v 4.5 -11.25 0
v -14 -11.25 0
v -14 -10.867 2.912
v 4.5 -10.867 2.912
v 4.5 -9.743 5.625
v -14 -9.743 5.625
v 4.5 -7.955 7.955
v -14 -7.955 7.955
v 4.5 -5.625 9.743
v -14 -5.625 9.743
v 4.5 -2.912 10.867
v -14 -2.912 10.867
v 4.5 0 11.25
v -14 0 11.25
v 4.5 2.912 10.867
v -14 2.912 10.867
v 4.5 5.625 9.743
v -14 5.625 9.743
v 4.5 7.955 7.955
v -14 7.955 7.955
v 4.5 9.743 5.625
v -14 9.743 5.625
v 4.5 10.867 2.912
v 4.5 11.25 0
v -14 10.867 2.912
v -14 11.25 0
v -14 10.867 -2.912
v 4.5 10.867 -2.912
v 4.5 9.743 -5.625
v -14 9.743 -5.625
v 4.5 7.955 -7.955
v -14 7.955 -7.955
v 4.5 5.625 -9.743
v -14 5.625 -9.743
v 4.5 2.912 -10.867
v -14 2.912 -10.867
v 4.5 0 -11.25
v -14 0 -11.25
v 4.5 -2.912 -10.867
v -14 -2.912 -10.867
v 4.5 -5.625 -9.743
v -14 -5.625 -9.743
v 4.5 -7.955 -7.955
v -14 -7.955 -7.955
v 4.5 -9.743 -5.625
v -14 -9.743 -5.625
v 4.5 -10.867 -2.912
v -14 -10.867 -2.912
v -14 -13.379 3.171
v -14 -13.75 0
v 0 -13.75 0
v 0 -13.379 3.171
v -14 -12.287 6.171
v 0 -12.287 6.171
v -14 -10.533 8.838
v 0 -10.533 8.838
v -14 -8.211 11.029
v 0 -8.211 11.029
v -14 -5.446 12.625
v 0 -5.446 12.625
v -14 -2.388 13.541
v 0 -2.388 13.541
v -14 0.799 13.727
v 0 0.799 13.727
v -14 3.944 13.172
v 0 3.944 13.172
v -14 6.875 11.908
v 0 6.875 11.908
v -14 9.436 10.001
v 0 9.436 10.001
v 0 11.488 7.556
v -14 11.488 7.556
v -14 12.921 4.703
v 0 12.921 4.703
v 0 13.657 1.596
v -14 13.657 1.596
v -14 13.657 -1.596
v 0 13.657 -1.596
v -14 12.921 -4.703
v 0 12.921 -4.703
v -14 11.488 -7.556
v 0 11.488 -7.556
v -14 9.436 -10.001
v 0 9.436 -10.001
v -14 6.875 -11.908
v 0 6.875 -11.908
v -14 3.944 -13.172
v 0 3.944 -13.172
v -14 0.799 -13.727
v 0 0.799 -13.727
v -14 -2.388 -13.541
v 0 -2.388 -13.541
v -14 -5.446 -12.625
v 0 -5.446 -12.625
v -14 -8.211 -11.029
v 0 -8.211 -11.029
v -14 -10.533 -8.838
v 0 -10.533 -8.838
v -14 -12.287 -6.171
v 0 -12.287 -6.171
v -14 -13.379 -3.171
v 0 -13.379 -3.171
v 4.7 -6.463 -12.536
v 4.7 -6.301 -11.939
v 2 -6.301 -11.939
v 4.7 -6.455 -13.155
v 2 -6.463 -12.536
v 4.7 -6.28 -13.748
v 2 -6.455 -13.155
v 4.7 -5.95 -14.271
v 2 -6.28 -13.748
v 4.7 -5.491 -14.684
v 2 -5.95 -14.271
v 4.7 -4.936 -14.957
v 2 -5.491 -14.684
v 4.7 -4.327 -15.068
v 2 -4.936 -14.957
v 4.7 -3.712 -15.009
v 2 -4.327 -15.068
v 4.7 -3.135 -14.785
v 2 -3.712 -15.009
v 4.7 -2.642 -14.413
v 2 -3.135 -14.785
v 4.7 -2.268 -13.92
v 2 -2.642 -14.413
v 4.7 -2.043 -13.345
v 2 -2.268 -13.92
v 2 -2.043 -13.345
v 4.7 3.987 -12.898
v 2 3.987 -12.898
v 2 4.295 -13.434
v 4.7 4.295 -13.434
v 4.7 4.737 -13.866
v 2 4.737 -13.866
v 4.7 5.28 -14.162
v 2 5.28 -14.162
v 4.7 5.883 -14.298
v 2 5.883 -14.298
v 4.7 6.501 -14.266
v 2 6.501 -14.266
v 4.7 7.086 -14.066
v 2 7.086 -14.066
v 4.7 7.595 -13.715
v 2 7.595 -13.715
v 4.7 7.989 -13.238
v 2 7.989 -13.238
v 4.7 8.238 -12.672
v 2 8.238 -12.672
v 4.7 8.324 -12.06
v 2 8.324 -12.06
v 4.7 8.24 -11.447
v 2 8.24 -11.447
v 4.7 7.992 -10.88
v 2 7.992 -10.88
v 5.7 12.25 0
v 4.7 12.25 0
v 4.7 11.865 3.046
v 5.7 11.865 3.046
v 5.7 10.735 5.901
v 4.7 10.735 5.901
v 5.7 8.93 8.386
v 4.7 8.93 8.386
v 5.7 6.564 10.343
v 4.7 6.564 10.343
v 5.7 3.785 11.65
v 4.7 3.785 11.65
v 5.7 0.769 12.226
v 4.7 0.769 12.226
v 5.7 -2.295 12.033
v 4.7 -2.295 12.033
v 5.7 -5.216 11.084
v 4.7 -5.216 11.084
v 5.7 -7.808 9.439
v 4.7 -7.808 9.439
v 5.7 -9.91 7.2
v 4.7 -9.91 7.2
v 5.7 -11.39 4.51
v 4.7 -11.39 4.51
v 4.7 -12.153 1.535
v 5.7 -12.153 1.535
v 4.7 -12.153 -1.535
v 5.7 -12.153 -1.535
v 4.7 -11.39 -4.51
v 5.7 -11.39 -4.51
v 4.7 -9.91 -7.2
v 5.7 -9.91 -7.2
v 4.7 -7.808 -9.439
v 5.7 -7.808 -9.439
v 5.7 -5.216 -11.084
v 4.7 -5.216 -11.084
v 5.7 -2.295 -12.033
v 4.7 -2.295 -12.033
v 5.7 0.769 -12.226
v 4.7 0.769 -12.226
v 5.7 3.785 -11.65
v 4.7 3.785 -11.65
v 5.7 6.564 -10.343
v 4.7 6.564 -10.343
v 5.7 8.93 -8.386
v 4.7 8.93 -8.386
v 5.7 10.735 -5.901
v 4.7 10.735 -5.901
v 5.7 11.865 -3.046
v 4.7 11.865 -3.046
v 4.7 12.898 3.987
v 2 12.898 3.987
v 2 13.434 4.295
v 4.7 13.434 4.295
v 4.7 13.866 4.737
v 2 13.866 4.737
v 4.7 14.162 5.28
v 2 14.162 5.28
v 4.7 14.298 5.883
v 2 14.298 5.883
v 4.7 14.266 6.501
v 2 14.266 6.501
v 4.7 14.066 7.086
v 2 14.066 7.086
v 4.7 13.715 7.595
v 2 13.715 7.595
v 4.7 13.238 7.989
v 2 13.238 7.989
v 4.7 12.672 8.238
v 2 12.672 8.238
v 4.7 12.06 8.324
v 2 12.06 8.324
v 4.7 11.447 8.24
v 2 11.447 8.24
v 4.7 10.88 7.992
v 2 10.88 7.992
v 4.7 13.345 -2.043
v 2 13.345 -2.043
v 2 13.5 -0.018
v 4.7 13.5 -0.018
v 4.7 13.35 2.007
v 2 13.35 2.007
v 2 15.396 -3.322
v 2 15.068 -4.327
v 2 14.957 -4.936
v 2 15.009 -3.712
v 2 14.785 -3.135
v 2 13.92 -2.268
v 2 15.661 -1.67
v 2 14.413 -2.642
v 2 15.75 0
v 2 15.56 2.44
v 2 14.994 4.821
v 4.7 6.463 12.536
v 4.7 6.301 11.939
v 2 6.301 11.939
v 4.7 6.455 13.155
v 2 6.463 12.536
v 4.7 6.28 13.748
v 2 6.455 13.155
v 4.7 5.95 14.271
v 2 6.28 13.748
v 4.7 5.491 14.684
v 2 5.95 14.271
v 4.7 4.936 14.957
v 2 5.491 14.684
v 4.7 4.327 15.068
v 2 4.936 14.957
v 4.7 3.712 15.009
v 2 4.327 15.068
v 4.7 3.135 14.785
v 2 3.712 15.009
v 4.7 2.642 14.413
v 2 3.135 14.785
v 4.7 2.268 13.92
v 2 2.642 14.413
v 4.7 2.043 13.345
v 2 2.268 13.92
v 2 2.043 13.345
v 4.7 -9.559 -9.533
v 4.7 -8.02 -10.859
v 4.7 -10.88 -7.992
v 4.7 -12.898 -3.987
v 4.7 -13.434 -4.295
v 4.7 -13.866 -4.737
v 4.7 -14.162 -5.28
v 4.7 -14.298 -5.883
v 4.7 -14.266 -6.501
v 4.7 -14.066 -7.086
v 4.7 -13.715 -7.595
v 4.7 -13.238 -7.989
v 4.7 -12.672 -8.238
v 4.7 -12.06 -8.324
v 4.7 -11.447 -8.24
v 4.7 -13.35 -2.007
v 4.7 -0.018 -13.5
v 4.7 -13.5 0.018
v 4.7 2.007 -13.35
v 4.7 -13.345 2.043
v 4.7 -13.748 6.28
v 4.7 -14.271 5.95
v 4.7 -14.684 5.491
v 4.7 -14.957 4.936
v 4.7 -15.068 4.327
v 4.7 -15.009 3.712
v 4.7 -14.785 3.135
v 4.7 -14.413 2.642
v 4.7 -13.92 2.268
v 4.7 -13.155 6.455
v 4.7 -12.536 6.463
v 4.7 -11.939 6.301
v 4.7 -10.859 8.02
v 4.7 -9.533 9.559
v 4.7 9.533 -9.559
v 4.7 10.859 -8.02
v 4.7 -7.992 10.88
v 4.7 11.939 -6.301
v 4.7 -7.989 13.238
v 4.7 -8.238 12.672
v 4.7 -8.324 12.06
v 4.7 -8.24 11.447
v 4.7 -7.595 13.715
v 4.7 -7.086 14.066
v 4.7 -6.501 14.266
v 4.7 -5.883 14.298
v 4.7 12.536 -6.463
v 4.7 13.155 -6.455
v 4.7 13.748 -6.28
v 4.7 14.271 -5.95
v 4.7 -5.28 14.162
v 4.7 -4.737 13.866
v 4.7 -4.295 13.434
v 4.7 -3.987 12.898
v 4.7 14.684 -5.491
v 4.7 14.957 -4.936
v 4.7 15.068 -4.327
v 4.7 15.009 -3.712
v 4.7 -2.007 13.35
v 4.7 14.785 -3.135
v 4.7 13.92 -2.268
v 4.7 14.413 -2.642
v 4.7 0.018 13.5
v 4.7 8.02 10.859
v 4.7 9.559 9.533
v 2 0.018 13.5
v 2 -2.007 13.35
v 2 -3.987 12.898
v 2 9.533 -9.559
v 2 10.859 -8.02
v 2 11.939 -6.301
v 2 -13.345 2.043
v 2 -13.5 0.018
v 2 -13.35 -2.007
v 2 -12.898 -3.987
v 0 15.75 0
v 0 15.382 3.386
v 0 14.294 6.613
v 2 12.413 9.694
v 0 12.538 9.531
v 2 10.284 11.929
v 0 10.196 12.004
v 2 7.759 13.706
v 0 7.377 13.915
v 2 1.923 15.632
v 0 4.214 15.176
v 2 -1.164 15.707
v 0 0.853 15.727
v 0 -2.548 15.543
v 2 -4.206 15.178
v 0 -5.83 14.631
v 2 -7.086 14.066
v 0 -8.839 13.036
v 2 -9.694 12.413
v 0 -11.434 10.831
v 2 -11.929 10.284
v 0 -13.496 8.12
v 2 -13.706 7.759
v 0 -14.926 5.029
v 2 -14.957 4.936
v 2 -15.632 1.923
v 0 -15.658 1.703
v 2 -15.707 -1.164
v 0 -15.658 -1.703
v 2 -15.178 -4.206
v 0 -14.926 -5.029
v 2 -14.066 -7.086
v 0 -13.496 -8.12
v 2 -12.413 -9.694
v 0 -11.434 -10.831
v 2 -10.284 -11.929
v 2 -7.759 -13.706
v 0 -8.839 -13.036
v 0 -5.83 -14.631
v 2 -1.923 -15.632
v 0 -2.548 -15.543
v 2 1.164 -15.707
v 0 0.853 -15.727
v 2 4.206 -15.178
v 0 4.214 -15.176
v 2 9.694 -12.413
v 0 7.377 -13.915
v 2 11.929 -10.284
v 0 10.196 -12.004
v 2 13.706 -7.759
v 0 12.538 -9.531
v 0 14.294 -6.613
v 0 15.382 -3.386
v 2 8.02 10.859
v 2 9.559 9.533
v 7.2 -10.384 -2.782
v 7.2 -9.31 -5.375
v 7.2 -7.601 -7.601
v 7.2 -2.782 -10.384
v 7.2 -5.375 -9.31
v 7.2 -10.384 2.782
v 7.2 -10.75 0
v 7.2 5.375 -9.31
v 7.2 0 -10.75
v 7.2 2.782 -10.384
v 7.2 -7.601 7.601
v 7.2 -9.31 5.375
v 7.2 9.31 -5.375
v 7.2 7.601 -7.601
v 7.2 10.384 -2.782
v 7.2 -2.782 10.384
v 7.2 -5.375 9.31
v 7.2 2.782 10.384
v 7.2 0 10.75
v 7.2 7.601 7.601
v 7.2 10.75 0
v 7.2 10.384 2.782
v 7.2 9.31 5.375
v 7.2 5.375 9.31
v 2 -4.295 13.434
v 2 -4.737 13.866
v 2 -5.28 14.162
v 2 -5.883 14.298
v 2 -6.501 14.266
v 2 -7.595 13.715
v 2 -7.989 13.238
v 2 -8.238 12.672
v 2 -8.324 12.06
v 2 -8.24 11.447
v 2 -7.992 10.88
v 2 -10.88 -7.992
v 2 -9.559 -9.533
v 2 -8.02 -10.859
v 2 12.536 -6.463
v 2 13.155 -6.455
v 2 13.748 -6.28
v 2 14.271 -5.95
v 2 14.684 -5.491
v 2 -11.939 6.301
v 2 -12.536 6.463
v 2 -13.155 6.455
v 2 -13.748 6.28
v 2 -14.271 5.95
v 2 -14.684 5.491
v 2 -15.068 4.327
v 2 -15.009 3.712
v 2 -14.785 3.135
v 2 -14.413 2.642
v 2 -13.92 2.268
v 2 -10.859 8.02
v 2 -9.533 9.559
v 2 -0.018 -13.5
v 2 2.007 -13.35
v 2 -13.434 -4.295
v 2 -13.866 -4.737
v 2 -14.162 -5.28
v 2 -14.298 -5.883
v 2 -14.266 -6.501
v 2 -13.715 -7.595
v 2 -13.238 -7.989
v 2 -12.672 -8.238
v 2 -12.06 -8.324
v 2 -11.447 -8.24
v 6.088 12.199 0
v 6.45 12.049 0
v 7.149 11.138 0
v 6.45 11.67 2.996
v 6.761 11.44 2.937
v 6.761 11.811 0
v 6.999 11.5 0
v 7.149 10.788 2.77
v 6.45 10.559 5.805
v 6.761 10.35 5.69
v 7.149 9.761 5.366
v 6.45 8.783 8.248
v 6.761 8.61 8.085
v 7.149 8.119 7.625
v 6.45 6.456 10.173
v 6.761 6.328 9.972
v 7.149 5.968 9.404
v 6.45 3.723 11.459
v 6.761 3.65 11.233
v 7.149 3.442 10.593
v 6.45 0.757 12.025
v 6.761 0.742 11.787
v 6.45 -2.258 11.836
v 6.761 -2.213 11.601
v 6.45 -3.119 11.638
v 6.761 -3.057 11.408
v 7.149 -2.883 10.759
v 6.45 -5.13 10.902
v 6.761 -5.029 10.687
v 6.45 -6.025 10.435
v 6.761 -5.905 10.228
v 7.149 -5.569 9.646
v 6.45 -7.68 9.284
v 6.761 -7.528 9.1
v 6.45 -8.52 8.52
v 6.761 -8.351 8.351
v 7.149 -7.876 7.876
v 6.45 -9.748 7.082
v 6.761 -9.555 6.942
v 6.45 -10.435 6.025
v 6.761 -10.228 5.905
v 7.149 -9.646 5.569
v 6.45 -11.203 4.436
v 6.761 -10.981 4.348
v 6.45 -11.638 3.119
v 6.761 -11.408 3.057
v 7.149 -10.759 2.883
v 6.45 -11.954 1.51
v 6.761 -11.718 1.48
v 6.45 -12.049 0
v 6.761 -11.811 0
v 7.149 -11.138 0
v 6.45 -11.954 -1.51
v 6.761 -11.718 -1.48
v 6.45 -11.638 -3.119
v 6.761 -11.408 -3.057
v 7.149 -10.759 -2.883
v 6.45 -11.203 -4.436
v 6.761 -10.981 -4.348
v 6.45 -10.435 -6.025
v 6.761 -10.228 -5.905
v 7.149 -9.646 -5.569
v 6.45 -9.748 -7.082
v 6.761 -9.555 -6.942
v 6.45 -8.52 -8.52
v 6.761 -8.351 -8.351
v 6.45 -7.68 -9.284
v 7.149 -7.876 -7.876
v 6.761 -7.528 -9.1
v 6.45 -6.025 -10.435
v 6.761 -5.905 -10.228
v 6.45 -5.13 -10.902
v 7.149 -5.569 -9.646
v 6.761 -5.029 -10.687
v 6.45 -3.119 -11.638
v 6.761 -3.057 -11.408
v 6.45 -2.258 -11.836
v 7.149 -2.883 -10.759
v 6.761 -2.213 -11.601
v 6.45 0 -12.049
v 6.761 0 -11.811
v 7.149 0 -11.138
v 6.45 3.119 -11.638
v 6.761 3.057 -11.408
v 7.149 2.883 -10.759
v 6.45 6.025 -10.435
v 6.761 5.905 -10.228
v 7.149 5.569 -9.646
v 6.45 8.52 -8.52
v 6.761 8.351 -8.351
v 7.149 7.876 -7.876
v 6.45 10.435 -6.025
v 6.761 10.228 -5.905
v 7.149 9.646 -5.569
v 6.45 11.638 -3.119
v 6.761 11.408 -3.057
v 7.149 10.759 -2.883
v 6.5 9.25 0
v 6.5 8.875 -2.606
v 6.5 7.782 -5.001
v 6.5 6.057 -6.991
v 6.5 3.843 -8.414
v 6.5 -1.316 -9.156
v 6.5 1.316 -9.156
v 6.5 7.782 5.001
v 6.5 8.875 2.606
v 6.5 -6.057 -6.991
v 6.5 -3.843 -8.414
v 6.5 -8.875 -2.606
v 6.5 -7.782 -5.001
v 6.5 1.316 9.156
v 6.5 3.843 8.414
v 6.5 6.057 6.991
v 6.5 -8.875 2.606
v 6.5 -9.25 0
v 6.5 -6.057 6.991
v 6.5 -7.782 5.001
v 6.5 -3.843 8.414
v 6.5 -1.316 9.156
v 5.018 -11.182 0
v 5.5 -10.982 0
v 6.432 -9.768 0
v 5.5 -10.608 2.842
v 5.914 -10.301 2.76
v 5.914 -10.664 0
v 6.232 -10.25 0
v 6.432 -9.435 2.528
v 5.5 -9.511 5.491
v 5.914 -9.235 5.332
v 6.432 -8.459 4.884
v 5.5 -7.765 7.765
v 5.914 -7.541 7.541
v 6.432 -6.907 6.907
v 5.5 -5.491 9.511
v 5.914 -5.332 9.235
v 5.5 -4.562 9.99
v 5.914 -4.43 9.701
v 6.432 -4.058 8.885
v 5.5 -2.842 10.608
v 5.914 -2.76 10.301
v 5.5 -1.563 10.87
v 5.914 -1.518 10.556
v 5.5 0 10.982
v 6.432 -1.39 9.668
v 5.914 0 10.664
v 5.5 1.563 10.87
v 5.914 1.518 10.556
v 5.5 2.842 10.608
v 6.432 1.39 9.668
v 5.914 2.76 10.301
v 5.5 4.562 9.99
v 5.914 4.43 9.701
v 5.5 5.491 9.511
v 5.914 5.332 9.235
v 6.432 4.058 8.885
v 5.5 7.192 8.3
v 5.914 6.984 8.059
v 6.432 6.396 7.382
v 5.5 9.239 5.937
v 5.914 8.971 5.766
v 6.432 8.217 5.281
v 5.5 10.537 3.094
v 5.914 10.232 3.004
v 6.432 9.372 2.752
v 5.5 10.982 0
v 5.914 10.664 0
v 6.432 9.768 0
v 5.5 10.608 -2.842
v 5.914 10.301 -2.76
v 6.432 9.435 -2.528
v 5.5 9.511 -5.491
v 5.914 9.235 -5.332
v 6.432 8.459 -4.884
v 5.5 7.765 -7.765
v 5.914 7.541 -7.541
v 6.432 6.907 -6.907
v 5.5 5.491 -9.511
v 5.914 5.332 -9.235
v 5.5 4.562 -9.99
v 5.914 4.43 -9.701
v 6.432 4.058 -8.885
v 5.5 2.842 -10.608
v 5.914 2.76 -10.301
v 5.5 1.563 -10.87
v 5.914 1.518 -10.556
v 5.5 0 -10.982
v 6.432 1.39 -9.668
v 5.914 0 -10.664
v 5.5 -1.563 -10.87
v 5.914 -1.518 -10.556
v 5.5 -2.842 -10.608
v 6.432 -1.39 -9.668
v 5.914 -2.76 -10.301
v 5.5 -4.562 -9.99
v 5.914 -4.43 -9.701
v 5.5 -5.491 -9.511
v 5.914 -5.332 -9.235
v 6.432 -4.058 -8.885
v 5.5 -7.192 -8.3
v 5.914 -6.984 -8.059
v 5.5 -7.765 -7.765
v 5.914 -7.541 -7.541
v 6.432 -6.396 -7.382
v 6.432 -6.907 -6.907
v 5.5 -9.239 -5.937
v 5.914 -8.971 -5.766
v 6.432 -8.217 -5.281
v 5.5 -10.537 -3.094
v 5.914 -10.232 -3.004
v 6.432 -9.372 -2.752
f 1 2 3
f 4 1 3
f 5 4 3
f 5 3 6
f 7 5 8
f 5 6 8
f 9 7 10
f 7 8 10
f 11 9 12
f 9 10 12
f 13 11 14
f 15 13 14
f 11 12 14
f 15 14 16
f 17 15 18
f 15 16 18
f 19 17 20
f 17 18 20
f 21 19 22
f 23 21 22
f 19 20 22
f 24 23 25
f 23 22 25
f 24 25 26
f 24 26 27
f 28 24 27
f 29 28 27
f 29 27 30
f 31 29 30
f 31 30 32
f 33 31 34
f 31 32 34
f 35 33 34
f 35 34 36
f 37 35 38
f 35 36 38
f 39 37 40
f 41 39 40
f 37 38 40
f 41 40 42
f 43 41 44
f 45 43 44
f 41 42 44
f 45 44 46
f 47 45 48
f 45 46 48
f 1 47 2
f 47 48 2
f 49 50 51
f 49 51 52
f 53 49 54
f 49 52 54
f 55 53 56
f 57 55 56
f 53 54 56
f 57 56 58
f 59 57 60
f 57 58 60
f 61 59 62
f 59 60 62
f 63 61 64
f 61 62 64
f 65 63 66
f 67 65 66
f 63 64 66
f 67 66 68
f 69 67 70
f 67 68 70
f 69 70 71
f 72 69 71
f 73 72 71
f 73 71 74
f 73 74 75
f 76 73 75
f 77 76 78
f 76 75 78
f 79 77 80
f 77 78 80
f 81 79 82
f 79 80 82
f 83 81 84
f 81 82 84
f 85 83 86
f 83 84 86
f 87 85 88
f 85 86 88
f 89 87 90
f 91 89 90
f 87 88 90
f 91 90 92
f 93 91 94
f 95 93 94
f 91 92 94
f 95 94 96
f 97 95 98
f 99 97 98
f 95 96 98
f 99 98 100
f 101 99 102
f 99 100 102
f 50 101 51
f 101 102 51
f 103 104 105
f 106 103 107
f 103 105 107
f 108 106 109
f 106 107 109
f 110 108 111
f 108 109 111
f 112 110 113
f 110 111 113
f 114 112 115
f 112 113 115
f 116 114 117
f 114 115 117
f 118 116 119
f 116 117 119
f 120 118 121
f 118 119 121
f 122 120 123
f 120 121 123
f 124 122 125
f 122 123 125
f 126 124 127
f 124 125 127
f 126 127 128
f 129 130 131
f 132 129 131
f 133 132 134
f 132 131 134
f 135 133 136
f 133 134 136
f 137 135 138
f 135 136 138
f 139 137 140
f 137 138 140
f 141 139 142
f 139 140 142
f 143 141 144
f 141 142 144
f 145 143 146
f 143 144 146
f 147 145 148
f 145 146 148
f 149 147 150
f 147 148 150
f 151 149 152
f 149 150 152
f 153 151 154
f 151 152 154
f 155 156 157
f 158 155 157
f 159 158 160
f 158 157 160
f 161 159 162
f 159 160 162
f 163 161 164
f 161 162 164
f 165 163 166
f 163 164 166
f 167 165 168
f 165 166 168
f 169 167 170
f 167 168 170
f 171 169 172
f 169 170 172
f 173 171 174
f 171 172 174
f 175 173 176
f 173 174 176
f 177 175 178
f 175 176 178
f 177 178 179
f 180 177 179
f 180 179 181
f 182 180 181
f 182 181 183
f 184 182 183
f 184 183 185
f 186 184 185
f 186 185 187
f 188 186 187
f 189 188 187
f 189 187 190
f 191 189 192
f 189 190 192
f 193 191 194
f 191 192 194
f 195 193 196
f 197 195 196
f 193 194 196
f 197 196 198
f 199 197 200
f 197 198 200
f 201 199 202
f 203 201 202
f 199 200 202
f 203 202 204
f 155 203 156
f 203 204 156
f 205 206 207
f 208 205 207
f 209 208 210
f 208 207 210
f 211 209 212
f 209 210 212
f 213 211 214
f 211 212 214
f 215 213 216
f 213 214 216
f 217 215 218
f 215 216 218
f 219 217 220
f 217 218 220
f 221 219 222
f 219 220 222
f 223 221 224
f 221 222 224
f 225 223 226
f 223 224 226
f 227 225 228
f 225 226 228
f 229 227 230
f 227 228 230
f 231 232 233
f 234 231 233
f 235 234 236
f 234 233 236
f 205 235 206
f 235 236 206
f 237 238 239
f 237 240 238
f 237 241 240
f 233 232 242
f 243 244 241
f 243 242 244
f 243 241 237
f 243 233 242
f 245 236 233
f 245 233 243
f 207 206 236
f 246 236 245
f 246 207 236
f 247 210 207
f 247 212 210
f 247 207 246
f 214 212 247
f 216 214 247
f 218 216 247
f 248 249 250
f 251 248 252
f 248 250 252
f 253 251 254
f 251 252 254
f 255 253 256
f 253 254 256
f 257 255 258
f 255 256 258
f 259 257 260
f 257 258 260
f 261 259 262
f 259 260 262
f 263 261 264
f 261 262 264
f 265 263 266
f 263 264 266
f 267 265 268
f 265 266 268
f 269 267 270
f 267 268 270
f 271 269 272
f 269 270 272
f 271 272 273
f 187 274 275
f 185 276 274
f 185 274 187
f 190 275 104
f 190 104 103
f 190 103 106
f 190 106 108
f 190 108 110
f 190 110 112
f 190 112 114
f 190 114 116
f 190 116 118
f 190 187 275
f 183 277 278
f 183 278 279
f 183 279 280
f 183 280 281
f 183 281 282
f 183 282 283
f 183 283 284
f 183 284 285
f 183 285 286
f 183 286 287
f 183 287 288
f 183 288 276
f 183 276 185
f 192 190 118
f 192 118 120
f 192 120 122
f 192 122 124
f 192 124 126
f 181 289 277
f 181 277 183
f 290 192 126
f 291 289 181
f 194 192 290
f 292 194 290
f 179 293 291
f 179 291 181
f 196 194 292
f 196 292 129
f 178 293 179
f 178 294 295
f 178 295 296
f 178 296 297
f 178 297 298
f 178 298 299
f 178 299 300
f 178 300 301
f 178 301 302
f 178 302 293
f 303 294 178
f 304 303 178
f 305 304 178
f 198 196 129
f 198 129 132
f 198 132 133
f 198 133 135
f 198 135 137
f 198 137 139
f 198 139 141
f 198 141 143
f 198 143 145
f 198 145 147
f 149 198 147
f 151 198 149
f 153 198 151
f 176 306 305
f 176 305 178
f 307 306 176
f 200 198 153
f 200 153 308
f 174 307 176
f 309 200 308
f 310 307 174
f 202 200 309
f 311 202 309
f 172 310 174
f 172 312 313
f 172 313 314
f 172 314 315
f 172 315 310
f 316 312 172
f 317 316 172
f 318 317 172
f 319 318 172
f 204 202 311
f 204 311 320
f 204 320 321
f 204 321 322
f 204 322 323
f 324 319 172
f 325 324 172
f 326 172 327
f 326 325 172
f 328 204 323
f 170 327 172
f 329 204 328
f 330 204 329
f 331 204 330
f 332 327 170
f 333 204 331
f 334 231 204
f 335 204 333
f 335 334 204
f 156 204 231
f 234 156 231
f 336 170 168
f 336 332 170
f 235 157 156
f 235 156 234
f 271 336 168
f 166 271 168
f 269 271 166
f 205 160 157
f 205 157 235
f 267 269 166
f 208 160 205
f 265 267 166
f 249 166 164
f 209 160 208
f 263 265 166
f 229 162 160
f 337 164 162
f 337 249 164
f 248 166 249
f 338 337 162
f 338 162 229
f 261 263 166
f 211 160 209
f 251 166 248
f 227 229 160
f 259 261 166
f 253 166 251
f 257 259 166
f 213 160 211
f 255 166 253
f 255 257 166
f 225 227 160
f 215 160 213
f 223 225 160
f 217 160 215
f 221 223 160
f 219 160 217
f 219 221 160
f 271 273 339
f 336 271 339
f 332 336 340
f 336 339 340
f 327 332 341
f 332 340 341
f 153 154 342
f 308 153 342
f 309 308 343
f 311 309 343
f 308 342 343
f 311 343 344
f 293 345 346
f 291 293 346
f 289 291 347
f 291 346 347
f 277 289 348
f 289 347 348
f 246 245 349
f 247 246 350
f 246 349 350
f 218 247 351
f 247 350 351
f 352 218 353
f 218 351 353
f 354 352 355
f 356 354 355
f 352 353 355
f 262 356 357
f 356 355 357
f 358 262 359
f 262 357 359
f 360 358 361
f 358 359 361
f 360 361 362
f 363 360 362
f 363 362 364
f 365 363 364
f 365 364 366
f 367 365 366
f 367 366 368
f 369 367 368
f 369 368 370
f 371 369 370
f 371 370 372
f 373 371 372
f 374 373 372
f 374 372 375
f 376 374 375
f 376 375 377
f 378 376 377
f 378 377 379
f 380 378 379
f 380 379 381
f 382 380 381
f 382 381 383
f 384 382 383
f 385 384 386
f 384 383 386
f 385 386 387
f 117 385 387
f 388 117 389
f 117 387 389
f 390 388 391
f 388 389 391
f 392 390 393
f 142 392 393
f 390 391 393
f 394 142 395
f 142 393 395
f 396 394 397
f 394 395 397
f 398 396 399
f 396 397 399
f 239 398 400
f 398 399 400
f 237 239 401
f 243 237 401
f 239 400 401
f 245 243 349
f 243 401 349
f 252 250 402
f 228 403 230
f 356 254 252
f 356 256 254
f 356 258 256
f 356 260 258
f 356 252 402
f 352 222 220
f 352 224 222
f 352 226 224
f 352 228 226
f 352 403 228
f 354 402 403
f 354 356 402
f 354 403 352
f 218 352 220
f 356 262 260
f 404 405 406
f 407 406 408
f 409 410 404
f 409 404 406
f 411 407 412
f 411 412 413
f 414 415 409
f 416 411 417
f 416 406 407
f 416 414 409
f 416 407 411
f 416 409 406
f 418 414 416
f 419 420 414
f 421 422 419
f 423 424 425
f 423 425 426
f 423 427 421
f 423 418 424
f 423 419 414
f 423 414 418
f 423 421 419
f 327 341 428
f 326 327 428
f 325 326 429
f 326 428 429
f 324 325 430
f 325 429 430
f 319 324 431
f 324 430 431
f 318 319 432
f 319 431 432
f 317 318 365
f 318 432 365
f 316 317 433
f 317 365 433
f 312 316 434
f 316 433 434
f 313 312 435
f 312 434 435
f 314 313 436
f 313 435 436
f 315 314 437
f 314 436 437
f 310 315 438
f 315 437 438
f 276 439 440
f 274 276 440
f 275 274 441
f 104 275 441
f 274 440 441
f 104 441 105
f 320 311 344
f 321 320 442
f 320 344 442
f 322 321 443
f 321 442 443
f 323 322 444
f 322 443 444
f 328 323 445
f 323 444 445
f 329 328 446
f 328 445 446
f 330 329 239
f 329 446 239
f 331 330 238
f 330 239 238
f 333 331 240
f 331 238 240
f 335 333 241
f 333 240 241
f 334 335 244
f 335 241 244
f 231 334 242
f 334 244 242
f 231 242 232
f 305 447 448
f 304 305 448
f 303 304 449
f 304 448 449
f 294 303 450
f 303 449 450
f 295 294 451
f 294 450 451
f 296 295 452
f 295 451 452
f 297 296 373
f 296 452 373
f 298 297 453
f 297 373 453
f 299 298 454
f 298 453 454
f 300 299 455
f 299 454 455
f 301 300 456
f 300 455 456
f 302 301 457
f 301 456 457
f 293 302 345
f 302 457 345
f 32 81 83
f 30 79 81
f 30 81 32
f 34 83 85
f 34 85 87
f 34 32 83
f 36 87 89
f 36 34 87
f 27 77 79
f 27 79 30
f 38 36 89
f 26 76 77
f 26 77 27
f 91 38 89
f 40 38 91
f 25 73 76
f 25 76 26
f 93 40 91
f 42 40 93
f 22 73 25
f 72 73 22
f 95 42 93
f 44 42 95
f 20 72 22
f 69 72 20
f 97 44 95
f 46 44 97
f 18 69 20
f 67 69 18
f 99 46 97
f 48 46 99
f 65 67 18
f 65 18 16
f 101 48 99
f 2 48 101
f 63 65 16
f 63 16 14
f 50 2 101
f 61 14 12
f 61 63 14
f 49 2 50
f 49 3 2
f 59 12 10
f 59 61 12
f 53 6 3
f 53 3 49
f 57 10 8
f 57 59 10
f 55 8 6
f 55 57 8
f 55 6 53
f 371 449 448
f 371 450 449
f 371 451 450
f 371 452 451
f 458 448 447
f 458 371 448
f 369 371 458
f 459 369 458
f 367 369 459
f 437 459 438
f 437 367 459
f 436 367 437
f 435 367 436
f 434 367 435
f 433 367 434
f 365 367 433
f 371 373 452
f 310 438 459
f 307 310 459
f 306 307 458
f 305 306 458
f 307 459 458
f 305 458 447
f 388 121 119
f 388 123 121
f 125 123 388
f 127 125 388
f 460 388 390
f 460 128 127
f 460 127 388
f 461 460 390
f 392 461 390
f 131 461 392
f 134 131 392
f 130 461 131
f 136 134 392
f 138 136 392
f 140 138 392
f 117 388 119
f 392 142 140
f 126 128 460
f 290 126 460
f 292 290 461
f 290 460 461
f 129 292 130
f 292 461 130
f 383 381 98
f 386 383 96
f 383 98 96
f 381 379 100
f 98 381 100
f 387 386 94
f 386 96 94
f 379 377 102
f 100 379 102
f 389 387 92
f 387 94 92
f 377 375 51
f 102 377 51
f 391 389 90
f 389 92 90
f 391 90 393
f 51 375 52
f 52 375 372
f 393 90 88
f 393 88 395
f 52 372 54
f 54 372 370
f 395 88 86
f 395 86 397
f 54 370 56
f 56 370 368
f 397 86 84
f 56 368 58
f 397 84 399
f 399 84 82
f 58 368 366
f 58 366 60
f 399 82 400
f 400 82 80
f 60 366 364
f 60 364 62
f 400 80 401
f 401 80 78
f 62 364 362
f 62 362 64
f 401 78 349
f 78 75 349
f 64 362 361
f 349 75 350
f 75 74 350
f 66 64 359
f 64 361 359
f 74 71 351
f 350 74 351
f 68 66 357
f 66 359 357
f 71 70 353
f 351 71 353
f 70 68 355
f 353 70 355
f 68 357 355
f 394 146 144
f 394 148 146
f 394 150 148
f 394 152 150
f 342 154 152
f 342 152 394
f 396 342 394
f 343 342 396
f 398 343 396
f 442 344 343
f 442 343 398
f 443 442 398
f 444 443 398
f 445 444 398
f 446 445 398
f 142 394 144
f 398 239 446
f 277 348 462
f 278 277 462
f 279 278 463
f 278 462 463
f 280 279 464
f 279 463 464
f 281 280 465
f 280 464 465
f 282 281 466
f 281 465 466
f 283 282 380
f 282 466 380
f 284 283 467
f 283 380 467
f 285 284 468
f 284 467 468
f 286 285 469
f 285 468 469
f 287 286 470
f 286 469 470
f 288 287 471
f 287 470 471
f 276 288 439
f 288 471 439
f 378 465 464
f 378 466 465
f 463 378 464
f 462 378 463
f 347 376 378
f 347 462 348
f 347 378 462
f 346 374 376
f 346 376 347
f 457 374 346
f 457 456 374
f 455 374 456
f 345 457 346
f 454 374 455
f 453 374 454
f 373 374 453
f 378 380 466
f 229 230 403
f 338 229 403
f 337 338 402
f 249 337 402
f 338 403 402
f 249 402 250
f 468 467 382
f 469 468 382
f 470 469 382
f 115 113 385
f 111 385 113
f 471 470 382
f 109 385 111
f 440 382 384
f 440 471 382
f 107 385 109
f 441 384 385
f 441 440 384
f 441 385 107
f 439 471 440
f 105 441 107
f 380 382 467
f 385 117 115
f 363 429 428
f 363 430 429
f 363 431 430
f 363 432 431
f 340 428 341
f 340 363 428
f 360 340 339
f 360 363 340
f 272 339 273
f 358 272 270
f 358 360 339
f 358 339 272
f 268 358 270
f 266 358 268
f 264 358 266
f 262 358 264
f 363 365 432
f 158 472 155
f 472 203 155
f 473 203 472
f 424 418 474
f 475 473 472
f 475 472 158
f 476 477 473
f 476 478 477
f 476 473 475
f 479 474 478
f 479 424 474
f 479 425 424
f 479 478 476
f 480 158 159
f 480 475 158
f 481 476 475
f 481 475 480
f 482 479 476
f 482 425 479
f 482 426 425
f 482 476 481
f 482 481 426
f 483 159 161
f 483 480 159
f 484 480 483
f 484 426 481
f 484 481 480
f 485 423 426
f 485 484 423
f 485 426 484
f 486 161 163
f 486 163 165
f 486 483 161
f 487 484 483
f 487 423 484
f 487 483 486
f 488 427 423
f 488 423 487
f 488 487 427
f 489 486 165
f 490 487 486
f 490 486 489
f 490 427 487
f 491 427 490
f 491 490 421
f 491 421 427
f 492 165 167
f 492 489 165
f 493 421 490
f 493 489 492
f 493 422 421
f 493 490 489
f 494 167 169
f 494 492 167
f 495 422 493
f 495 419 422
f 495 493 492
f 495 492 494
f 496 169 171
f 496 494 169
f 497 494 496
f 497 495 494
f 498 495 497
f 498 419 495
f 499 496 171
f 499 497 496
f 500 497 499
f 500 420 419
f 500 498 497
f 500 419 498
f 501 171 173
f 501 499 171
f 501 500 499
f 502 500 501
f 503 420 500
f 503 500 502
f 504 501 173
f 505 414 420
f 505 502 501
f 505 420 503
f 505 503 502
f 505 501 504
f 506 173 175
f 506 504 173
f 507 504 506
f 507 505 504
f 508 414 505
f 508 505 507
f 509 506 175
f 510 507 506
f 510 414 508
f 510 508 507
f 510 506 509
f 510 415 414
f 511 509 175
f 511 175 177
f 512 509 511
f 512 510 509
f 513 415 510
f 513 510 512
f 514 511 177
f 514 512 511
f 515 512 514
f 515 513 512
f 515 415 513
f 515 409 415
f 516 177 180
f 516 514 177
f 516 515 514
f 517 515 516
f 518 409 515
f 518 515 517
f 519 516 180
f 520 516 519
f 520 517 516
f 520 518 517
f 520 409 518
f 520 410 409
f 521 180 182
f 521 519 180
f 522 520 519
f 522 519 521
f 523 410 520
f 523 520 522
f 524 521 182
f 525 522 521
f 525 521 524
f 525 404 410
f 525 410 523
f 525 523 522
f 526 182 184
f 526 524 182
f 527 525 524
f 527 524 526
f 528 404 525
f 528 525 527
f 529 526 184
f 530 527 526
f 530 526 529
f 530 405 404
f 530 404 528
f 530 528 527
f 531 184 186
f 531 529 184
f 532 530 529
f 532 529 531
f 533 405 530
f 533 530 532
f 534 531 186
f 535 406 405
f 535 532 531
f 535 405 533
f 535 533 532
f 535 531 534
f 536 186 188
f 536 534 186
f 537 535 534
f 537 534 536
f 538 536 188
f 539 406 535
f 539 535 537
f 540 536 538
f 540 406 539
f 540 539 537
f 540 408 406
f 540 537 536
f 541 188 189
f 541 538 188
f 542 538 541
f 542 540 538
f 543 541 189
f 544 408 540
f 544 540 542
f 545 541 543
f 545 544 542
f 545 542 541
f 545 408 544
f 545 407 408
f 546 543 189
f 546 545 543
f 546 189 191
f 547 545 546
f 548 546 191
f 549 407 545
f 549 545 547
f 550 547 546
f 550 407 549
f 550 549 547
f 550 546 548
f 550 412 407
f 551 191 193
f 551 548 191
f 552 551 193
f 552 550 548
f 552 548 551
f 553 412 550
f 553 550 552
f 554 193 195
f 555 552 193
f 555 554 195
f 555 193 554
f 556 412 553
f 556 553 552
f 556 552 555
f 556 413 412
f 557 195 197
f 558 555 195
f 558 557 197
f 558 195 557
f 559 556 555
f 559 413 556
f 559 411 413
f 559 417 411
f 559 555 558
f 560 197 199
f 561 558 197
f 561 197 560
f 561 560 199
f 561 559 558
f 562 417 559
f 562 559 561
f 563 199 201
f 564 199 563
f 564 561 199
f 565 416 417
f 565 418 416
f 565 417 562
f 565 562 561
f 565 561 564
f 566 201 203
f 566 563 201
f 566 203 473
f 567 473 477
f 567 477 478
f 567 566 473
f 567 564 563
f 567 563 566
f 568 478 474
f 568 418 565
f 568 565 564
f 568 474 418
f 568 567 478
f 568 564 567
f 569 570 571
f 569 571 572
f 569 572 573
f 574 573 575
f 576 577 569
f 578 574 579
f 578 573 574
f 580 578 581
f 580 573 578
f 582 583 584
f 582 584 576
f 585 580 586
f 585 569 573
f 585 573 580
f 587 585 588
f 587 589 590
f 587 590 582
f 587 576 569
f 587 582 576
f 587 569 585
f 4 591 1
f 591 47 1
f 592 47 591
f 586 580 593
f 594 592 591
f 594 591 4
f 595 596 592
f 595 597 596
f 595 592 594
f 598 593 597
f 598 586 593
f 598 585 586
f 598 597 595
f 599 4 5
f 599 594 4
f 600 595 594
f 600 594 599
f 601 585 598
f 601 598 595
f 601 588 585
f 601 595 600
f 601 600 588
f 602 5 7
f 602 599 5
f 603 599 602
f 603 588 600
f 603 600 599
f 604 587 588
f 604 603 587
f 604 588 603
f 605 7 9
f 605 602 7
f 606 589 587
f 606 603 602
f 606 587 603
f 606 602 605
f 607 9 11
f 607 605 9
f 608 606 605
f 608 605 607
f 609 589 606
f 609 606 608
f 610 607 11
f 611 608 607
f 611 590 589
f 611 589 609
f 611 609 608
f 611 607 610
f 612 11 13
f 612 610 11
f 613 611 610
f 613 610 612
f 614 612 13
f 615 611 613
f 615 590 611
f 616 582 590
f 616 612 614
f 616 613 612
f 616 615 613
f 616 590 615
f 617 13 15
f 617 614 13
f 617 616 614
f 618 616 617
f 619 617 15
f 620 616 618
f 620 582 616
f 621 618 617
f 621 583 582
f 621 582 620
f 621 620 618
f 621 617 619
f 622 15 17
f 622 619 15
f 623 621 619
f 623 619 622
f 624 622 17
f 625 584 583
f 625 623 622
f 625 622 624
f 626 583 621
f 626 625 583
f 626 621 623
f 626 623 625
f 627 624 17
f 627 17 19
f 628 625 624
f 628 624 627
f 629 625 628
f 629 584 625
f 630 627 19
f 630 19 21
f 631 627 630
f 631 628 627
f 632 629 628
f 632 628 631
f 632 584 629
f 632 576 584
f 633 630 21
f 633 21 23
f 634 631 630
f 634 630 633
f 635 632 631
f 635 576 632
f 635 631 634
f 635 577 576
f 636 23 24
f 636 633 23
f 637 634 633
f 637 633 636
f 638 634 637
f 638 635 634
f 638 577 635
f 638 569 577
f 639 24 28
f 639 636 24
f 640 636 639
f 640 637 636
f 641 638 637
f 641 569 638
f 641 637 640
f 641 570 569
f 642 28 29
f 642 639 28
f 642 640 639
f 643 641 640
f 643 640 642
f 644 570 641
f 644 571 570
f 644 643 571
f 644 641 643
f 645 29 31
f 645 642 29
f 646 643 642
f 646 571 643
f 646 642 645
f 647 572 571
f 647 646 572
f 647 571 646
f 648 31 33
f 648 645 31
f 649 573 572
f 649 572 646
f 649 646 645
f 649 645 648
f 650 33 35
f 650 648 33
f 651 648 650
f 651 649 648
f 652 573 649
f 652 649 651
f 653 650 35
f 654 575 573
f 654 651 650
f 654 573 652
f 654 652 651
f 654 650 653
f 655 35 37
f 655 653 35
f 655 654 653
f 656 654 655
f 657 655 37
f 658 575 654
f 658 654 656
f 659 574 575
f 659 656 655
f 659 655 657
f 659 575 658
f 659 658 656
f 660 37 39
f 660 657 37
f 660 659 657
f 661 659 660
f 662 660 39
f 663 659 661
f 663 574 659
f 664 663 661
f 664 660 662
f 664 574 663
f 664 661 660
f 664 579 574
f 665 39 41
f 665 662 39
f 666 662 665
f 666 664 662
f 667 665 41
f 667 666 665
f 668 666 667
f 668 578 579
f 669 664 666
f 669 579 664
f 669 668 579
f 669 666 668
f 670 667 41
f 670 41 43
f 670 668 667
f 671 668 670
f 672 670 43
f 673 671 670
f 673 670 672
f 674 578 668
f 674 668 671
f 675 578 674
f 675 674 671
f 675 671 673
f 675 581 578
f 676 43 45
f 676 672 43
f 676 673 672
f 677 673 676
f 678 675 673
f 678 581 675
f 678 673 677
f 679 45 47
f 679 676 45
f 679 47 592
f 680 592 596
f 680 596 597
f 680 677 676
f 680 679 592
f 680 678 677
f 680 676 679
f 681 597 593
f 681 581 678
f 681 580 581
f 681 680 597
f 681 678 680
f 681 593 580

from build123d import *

# Parameters (mm, degrees)
SKETCH1_R           = 15.75
BOSS_EXTRUDE1_DEPTH = 2
BOSS_EXTRUDE2_DEPTH = 2.7
SKETCH3_R           = 12.25
BOSS_EXTRUDE3_DEPTH = 2.5
SKETCH4_R           = 13.75
BOSS_EXTRUDE4_DEPTH = 14
SKETCH5_R           = 11.25
CUT_EXTRUDE1_DEPTH  = 20.5
FILLET1_R           = 1.5
FILLET2_R           = 2


with BuildPart() as part:
    # Sketch1 → Boss-Extrude1 (new body)
    with BuildSketch(Plane.YZ):
        Circle(SKETCH1_R)
    extrude(amount=BOSS_EXTRUDE1_DEPTH)

    # Sketch2 → Boss-Extrude2 (add)
    with BuildSketch(Plane.YZ.offset(2)):
        with BuildLine():
            ThreePointArc((10.880321188, 7.991783959), (8.814480217, 10.225210927), (6.300979972, 11.939332117))
            ThreePointArc((6.300979972, 11.939332117), (4.935582223, 14.956688408), (2.042504262, 13.344593525))
            ThreePointArc((2.042504262, 13.344593525), (-0.997537251, 13.46309472), (-3.986917036, 12.897848369))
            ThreePointArc((-3.986917036, 12.897848369), (-7.085992138, 14.065959456), (-7.991783959, 10.880321188))
            ThreePointArc((-7.991783959, 10.880321188), (-10.225210927, 8.814480217), (-11.939332117, 6.300979972))
            ThreePointArc((-11.939332117, 6.300979972), (-14.956688408, 4.935582223), (-13.344593525, 2.042504262))
            ThreePointArc((-13.344593525, 2.042504262), (-13.46309472, -0.997537251), (-12.897848369, -3.986917036))
            ThreePointArc((-12.897848369, -3.986917036), (-14.065959456, -7.085992138), (-10.880321188, -7.991783959))
            ThreePointArc((-10.880321188, -7.991783959), (-8.814480217, -10.225210927), (-6.300979972, -11.939332117))
            ThreePointArc((-6.300979972, -11.939332117), (-4.935582223, -14.956688408), (-2.042504262, -13.344593525))
            ThreePointArc((-2.042504262, -13.344593525), (0.997537251, -13.46309472), (3.986917036, -12.897848369))
            ThreePointArc((3.986917036, -12.897848369), (7.085992138, -14.065959456), (7.991783959, -10.880321188))
            ThreePointArc((7.991783959, -10.880321188), (10.225210927, -8.814480217), (11.939332117, -6.300979972))
            ThreePointArc((11.939332117, -6.300979972), (14.956688408, -4.935582223), (13.344593525, -2.042504262))
            ThreePointArc((13.344593525, -2.042504262), (13.46309472, 0.997537251), (12.897848369, 3.986917036))
            ThreePointArc((12.897848369, 3.986917036), (14.065959456, 7.085992138), (10.880321188, 7.991783959))
        make_face()
    extrude(amount=BOSS_EXTRUDE2_DEPTH)

    # Sketch3 → Boss-Extrude3 (add)
    with BuildSketch(Plane.YZ.offset(4.7)):
        Circle(SKETCH3_R)
    extrude(amount=BOSS_EXTRUDE3_DEPTH)

    # Sketch4 → Boss-Extrude4 (add)
    with BuildSketch(Plane(origin=(0, 0, 0), x_dir=(0, -1, 0), z_dir=(-1, 0, 0))):
        Circle(SKETCH4_R)
    extrude(amount=BOSS_EXTRUDE4_DEPTH)

    # Sketch5 → Cut-Extrude1 (cut)
    with BuildSketch(Plane(origin=(-14, 0, 0), x_dir=(0, -1, 0), z_dir=(-1, 0, 0))):
        Circle(SKETCH5_R)
    extrude(amount=-CUT_EXTRUDE1_DEPTH, mode=Mode.SUBTRACT)

    # Fillet1
    fillet1_edges = [part.edges().sort_by_distance(p)[0] for p in [
        (7.2, -12.25, 0),
    ]]
    fillet(fillet1_edges, radius=FILLET1_R)

    # Fillet2
    fillet2_edges = [part.edges().sort_by_distance(p)[0] for p in [
        (6.5, 11.25, 0),
    ]]
    fillet(fillet2_edges, radius=FILLET2_R)


solid = part.part
